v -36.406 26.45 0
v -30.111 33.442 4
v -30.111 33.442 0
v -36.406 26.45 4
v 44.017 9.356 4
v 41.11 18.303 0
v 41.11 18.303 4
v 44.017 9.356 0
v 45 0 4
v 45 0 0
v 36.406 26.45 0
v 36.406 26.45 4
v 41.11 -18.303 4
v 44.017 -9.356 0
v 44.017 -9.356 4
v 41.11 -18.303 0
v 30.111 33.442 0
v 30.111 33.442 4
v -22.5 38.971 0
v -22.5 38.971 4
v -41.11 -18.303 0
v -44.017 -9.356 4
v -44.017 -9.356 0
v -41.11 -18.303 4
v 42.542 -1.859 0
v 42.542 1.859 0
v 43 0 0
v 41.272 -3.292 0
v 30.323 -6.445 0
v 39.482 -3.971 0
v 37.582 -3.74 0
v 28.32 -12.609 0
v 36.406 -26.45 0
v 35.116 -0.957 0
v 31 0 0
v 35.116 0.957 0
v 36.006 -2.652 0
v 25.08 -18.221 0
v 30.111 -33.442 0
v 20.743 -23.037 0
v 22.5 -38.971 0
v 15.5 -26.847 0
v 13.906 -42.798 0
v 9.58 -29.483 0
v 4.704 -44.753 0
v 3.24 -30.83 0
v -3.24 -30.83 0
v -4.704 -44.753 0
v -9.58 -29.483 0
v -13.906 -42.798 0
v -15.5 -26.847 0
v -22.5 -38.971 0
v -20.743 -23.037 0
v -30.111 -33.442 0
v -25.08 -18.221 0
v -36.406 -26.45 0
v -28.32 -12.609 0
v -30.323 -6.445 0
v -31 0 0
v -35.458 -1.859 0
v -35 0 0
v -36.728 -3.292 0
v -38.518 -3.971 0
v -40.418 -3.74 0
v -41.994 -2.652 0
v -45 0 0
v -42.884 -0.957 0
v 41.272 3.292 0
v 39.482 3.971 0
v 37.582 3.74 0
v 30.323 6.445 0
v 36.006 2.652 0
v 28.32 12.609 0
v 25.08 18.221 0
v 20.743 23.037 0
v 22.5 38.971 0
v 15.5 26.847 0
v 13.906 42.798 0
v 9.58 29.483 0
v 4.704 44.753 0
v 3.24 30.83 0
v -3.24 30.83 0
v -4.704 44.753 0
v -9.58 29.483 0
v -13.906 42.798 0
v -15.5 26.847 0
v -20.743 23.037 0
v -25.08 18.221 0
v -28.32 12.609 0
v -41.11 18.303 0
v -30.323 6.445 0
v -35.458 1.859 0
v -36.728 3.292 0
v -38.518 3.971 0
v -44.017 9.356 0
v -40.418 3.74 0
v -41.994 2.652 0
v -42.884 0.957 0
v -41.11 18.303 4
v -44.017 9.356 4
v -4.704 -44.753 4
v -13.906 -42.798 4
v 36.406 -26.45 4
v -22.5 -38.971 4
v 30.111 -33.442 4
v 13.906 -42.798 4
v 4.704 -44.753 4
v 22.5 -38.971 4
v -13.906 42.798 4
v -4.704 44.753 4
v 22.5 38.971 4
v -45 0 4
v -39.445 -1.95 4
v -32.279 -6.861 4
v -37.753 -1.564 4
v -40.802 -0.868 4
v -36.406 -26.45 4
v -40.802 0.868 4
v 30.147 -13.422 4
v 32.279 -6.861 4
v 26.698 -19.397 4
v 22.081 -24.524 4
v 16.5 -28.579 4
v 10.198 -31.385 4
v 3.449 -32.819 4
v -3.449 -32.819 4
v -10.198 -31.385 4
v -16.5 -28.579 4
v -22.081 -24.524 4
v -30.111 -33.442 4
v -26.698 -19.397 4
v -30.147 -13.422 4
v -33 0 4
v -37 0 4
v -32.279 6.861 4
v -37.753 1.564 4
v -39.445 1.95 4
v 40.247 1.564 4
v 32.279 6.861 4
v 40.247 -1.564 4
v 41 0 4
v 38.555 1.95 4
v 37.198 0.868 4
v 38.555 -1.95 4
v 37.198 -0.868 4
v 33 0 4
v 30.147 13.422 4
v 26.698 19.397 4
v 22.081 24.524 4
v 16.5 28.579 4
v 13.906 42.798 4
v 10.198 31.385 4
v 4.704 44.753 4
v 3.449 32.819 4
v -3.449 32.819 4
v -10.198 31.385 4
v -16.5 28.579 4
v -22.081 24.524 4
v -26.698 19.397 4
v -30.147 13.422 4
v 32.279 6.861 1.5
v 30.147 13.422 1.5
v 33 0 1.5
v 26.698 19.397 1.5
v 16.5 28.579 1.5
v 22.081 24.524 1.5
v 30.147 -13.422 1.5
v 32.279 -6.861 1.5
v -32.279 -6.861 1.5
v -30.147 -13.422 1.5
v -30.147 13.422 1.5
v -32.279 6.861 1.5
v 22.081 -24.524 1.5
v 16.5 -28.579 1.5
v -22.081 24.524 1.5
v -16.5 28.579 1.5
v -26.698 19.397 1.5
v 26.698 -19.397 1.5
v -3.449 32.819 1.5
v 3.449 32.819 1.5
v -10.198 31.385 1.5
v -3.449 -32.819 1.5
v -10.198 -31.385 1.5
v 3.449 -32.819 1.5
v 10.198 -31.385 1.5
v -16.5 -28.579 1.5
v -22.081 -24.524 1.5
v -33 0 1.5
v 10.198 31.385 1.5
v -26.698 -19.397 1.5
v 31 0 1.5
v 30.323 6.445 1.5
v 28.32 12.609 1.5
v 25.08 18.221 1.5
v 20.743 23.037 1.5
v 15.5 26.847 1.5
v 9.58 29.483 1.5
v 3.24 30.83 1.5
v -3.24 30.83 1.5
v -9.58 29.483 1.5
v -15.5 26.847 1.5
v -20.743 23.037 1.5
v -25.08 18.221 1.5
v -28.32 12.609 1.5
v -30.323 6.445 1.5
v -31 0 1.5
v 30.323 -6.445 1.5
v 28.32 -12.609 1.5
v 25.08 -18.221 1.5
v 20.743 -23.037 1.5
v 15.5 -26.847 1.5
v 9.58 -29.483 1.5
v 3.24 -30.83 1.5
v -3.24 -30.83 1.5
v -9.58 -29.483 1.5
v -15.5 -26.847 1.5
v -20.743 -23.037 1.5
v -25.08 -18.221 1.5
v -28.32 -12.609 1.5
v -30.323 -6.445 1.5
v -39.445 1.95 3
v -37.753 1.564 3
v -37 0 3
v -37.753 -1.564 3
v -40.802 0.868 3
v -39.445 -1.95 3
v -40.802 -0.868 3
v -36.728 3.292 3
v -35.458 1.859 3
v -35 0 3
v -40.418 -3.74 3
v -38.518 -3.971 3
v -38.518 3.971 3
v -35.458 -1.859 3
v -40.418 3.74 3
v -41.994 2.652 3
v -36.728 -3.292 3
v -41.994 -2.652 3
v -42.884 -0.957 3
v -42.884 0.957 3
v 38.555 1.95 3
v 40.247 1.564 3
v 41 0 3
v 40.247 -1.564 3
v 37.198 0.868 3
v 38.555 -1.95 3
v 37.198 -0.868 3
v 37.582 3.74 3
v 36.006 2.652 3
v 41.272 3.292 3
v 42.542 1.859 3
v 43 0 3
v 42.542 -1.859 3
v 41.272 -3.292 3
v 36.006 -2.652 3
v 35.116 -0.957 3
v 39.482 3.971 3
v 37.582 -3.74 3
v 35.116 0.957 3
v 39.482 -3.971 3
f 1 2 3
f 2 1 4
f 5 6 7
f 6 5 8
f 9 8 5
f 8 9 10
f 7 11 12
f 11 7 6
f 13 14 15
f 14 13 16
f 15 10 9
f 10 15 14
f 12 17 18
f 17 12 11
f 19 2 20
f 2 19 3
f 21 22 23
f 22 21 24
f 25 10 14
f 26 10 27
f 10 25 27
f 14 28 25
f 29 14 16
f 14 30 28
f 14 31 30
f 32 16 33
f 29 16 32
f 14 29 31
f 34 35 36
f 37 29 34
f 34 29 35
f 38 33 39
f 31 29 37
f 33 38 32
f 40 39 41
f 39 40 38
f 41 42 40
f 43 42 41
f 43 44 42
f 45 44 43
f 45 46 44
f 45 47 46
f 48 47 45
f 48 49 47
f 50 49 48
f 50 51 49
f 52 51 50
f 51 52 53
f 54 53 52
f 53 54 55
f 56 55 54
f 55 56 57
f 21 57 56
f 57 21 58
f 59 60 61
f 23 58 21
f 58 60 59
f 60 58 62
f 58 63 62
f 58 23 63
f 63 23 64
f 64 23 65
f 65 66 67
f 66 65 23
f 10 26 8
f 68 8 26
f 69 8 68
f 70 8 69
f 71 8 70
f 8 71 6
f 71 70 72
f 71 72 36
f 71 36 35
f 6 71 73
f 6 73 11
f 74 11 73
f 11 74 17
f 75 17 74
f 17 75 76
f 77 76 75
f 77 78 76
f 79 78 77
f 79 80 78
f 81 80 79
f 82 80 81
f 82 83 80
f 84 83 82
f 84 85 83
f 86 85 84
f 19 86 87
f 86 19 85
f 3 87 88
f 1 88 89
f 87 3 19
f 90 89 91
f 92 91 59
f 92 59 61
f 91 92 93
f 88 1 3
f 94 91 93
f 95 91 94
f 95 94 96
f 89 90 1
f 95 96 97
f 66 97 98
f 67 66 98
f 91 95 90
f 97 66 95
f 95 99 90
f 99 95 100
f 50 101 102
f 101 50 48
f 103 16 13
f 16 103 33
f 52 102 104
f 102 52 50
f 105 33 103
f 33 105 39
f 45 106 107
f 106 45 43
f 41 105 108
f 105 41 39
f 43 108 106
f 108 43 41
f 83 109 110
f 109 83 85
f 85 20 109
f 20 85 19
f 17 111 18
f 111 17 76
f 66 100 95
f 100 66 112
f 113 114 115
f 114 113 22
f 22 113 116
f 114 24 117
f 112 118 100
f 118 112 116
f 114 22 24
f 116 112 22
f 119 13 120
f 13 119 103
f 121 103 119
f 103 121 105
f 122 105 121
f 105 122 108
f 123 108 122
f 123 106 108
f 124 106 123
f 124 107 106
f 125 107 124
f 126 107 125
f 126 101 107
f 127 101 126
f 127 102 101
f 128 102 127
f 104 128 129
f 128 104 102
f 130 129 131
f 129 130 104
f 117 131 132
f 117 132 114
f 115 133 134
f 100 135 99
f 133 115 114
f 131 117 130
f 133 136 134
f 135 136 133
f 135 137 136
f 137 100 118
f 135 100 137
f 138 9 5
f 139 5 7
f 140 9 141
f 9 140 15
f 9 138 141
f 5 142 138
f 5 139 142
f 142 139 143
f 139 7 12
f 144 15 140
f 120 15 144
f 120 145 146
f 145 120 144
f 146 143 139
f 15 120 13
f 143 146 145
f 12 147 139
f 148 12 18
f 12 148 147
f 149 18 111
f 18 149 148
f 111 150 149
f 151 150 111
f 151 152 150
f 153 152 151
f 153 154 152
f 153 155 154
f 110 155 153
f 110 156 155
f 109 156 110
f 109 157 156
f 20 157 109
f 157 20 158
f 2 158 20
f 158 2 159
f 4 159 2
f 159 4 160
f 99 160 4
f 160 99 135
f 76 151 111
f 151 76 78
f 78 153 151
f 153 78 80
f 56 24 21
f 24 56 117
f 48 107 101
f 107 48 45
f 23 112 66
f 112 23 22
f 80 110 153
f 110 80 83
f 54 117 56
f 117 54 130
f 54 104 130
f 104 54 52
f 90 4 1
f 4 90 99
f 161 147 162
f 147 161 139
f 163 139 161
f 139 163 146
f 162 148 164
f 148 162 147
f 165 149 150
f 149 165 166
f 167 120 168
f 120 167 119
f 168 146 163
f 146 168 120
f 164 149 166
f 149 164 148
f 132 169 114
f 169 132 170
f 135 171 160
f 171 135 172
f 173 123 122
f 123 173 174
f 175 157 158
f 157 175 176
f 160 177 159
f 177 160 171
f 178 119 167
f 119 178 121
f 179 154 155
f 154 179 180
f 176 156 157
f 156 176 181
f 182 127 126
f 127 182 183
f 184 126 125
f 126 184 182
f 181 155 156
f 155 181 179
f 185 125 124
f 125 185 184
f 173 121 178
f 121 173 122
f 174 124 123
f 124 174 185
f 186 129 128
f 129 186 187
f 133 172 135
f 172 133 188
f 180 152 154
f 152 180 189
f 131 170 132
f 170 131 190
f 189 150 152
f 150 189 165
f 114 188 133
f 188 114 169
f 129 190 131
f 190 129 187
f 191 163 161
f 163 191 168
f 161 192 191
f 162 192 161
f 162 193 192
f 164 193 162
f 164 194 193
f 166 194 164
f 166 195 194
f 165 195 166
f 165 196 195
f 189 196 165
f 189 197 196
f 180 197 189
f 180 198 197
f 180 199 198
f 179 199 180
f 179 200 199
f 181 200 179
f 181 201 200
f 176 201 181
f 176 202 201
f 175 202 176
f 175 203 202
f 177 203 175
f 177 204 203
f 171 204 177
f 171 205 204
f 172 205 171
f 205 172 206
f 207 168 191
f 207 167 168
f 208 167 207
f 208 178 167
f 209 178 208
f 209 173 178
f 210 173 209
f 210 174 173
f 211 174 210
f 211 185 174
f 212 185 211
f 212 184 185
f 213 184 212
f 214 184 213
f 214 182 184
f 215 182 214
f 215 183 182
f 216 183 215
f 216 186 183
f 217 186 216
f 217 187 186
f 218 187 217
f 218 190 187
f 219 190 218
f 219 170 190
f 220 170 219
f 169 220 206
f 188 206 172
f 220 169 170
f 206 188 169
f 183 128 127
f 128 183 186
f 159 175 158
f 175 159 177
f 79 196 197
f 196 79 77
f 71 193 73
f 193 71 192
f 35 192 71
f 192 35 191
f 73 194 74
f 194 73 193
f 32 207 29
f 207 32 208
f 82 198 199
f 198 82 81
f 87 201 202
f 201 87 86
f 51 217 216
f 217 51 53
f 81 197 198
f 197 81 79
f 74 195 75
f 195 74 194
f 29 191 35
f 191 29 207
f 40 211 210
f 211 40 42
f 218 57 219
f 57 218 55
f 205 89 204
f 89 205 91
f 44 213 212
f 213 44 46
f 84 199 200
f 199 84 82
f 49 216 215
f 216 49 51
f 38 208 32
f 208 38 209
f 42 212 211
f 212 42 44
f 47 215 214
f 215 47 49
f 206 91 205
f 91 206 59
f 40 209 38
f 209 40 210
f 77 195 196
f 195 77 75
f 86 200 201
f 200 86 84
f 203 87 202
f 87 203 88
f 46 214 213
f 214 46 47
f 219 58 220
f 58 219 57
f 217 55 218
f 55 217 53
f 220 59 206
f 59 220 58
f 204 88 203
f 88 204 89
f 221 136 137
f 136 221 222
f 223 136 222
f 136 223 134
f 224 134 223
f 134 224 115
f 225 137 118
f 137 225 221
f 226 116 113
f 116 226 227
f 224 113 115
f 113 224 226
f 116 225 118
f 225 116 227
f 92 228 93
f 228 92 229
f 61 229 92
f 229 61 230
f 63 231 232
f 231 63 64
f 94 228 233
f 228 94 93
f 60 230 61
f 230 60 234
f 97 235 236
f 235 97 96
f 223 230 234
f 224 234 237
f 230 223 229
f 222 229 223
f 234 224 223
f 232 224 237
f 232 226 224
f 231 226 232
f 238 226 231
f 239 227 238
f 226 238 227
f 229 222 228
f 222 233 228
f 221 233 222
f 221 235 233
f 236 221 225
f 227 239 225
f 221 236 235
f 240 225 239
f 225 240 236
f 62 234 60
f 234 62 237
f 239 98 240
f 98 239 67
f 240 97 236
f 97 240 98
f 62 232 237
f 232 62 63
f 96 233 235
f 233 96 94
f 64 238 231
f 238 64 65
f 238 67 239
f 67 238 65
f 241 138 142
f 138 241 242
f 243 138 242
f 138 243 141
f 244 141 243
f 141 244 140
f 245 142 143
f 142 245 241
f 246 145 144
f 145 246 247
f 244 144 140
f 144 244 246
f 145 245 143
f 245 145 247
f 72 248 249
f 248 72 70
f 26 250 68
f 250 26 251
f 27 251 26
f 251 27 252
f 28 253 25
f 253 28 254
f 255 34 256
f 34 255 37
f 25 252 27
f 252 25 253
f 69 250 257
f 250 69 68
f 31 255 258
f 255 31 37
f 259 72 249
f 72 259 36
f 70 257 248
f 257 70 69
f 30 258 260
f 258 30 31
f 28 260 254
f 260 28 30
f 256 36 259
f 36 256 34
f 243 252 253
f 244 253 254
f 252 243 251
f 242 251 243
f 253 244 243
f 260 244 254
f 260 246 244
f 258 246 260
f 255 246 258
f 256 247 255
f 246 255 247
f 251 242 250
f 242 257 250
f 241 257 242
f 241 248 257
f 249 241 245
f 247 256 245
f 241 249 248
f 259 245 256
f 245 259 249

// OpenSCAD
outer_cylinder_radius=45;
outer_cylinder_height=4;

inner_cylinder1_radius=33;
inner_cylinder1_height=5;

inner_cylinder2_radius=31;
inner_cylinder2_height=7;

screw1_x = - (outer_cylinder_radius-((outer_cylinder_radius-inner_cylinder1_radius)/2));
screw2_x = (outer_cylinder_radius-((outer_cylinder_radius-inner_cylinder1_radius)/2));

screw_head_radius=4;
screw_head_height=3;
screw_height=7;
screw_radius=2;

difference()
{
cylinder(h=outer_cylinder_height, r=outer_cylinder_radius);
    
translate([0,0,+1.5]){
    cylinder(h=inner_cylinder1_height, r=inner_cylinder1_radius);
  }
  
  translate([0,0,-1]){
  cylinder(h=inner_cylinder2_height, r=inner_cylinder2_radius);
  }
  
  translate([screw1_x,0,-1]){
      cylinder(h=screw_height, r=screw_radius);
  }
  
  translate([screw1_x,0,0]){
  cylinder(h=screw_head_height, r=screw_head_radius);
  }
  
  translate([screw2_x,0,-1]){
      cylinder(h=screw_height, r=screw_radius);
  }
  
  translate([screw2_x,0,0]){
  cylinder(h=screw_head_height, r=screw_head_radius);
  }
}
